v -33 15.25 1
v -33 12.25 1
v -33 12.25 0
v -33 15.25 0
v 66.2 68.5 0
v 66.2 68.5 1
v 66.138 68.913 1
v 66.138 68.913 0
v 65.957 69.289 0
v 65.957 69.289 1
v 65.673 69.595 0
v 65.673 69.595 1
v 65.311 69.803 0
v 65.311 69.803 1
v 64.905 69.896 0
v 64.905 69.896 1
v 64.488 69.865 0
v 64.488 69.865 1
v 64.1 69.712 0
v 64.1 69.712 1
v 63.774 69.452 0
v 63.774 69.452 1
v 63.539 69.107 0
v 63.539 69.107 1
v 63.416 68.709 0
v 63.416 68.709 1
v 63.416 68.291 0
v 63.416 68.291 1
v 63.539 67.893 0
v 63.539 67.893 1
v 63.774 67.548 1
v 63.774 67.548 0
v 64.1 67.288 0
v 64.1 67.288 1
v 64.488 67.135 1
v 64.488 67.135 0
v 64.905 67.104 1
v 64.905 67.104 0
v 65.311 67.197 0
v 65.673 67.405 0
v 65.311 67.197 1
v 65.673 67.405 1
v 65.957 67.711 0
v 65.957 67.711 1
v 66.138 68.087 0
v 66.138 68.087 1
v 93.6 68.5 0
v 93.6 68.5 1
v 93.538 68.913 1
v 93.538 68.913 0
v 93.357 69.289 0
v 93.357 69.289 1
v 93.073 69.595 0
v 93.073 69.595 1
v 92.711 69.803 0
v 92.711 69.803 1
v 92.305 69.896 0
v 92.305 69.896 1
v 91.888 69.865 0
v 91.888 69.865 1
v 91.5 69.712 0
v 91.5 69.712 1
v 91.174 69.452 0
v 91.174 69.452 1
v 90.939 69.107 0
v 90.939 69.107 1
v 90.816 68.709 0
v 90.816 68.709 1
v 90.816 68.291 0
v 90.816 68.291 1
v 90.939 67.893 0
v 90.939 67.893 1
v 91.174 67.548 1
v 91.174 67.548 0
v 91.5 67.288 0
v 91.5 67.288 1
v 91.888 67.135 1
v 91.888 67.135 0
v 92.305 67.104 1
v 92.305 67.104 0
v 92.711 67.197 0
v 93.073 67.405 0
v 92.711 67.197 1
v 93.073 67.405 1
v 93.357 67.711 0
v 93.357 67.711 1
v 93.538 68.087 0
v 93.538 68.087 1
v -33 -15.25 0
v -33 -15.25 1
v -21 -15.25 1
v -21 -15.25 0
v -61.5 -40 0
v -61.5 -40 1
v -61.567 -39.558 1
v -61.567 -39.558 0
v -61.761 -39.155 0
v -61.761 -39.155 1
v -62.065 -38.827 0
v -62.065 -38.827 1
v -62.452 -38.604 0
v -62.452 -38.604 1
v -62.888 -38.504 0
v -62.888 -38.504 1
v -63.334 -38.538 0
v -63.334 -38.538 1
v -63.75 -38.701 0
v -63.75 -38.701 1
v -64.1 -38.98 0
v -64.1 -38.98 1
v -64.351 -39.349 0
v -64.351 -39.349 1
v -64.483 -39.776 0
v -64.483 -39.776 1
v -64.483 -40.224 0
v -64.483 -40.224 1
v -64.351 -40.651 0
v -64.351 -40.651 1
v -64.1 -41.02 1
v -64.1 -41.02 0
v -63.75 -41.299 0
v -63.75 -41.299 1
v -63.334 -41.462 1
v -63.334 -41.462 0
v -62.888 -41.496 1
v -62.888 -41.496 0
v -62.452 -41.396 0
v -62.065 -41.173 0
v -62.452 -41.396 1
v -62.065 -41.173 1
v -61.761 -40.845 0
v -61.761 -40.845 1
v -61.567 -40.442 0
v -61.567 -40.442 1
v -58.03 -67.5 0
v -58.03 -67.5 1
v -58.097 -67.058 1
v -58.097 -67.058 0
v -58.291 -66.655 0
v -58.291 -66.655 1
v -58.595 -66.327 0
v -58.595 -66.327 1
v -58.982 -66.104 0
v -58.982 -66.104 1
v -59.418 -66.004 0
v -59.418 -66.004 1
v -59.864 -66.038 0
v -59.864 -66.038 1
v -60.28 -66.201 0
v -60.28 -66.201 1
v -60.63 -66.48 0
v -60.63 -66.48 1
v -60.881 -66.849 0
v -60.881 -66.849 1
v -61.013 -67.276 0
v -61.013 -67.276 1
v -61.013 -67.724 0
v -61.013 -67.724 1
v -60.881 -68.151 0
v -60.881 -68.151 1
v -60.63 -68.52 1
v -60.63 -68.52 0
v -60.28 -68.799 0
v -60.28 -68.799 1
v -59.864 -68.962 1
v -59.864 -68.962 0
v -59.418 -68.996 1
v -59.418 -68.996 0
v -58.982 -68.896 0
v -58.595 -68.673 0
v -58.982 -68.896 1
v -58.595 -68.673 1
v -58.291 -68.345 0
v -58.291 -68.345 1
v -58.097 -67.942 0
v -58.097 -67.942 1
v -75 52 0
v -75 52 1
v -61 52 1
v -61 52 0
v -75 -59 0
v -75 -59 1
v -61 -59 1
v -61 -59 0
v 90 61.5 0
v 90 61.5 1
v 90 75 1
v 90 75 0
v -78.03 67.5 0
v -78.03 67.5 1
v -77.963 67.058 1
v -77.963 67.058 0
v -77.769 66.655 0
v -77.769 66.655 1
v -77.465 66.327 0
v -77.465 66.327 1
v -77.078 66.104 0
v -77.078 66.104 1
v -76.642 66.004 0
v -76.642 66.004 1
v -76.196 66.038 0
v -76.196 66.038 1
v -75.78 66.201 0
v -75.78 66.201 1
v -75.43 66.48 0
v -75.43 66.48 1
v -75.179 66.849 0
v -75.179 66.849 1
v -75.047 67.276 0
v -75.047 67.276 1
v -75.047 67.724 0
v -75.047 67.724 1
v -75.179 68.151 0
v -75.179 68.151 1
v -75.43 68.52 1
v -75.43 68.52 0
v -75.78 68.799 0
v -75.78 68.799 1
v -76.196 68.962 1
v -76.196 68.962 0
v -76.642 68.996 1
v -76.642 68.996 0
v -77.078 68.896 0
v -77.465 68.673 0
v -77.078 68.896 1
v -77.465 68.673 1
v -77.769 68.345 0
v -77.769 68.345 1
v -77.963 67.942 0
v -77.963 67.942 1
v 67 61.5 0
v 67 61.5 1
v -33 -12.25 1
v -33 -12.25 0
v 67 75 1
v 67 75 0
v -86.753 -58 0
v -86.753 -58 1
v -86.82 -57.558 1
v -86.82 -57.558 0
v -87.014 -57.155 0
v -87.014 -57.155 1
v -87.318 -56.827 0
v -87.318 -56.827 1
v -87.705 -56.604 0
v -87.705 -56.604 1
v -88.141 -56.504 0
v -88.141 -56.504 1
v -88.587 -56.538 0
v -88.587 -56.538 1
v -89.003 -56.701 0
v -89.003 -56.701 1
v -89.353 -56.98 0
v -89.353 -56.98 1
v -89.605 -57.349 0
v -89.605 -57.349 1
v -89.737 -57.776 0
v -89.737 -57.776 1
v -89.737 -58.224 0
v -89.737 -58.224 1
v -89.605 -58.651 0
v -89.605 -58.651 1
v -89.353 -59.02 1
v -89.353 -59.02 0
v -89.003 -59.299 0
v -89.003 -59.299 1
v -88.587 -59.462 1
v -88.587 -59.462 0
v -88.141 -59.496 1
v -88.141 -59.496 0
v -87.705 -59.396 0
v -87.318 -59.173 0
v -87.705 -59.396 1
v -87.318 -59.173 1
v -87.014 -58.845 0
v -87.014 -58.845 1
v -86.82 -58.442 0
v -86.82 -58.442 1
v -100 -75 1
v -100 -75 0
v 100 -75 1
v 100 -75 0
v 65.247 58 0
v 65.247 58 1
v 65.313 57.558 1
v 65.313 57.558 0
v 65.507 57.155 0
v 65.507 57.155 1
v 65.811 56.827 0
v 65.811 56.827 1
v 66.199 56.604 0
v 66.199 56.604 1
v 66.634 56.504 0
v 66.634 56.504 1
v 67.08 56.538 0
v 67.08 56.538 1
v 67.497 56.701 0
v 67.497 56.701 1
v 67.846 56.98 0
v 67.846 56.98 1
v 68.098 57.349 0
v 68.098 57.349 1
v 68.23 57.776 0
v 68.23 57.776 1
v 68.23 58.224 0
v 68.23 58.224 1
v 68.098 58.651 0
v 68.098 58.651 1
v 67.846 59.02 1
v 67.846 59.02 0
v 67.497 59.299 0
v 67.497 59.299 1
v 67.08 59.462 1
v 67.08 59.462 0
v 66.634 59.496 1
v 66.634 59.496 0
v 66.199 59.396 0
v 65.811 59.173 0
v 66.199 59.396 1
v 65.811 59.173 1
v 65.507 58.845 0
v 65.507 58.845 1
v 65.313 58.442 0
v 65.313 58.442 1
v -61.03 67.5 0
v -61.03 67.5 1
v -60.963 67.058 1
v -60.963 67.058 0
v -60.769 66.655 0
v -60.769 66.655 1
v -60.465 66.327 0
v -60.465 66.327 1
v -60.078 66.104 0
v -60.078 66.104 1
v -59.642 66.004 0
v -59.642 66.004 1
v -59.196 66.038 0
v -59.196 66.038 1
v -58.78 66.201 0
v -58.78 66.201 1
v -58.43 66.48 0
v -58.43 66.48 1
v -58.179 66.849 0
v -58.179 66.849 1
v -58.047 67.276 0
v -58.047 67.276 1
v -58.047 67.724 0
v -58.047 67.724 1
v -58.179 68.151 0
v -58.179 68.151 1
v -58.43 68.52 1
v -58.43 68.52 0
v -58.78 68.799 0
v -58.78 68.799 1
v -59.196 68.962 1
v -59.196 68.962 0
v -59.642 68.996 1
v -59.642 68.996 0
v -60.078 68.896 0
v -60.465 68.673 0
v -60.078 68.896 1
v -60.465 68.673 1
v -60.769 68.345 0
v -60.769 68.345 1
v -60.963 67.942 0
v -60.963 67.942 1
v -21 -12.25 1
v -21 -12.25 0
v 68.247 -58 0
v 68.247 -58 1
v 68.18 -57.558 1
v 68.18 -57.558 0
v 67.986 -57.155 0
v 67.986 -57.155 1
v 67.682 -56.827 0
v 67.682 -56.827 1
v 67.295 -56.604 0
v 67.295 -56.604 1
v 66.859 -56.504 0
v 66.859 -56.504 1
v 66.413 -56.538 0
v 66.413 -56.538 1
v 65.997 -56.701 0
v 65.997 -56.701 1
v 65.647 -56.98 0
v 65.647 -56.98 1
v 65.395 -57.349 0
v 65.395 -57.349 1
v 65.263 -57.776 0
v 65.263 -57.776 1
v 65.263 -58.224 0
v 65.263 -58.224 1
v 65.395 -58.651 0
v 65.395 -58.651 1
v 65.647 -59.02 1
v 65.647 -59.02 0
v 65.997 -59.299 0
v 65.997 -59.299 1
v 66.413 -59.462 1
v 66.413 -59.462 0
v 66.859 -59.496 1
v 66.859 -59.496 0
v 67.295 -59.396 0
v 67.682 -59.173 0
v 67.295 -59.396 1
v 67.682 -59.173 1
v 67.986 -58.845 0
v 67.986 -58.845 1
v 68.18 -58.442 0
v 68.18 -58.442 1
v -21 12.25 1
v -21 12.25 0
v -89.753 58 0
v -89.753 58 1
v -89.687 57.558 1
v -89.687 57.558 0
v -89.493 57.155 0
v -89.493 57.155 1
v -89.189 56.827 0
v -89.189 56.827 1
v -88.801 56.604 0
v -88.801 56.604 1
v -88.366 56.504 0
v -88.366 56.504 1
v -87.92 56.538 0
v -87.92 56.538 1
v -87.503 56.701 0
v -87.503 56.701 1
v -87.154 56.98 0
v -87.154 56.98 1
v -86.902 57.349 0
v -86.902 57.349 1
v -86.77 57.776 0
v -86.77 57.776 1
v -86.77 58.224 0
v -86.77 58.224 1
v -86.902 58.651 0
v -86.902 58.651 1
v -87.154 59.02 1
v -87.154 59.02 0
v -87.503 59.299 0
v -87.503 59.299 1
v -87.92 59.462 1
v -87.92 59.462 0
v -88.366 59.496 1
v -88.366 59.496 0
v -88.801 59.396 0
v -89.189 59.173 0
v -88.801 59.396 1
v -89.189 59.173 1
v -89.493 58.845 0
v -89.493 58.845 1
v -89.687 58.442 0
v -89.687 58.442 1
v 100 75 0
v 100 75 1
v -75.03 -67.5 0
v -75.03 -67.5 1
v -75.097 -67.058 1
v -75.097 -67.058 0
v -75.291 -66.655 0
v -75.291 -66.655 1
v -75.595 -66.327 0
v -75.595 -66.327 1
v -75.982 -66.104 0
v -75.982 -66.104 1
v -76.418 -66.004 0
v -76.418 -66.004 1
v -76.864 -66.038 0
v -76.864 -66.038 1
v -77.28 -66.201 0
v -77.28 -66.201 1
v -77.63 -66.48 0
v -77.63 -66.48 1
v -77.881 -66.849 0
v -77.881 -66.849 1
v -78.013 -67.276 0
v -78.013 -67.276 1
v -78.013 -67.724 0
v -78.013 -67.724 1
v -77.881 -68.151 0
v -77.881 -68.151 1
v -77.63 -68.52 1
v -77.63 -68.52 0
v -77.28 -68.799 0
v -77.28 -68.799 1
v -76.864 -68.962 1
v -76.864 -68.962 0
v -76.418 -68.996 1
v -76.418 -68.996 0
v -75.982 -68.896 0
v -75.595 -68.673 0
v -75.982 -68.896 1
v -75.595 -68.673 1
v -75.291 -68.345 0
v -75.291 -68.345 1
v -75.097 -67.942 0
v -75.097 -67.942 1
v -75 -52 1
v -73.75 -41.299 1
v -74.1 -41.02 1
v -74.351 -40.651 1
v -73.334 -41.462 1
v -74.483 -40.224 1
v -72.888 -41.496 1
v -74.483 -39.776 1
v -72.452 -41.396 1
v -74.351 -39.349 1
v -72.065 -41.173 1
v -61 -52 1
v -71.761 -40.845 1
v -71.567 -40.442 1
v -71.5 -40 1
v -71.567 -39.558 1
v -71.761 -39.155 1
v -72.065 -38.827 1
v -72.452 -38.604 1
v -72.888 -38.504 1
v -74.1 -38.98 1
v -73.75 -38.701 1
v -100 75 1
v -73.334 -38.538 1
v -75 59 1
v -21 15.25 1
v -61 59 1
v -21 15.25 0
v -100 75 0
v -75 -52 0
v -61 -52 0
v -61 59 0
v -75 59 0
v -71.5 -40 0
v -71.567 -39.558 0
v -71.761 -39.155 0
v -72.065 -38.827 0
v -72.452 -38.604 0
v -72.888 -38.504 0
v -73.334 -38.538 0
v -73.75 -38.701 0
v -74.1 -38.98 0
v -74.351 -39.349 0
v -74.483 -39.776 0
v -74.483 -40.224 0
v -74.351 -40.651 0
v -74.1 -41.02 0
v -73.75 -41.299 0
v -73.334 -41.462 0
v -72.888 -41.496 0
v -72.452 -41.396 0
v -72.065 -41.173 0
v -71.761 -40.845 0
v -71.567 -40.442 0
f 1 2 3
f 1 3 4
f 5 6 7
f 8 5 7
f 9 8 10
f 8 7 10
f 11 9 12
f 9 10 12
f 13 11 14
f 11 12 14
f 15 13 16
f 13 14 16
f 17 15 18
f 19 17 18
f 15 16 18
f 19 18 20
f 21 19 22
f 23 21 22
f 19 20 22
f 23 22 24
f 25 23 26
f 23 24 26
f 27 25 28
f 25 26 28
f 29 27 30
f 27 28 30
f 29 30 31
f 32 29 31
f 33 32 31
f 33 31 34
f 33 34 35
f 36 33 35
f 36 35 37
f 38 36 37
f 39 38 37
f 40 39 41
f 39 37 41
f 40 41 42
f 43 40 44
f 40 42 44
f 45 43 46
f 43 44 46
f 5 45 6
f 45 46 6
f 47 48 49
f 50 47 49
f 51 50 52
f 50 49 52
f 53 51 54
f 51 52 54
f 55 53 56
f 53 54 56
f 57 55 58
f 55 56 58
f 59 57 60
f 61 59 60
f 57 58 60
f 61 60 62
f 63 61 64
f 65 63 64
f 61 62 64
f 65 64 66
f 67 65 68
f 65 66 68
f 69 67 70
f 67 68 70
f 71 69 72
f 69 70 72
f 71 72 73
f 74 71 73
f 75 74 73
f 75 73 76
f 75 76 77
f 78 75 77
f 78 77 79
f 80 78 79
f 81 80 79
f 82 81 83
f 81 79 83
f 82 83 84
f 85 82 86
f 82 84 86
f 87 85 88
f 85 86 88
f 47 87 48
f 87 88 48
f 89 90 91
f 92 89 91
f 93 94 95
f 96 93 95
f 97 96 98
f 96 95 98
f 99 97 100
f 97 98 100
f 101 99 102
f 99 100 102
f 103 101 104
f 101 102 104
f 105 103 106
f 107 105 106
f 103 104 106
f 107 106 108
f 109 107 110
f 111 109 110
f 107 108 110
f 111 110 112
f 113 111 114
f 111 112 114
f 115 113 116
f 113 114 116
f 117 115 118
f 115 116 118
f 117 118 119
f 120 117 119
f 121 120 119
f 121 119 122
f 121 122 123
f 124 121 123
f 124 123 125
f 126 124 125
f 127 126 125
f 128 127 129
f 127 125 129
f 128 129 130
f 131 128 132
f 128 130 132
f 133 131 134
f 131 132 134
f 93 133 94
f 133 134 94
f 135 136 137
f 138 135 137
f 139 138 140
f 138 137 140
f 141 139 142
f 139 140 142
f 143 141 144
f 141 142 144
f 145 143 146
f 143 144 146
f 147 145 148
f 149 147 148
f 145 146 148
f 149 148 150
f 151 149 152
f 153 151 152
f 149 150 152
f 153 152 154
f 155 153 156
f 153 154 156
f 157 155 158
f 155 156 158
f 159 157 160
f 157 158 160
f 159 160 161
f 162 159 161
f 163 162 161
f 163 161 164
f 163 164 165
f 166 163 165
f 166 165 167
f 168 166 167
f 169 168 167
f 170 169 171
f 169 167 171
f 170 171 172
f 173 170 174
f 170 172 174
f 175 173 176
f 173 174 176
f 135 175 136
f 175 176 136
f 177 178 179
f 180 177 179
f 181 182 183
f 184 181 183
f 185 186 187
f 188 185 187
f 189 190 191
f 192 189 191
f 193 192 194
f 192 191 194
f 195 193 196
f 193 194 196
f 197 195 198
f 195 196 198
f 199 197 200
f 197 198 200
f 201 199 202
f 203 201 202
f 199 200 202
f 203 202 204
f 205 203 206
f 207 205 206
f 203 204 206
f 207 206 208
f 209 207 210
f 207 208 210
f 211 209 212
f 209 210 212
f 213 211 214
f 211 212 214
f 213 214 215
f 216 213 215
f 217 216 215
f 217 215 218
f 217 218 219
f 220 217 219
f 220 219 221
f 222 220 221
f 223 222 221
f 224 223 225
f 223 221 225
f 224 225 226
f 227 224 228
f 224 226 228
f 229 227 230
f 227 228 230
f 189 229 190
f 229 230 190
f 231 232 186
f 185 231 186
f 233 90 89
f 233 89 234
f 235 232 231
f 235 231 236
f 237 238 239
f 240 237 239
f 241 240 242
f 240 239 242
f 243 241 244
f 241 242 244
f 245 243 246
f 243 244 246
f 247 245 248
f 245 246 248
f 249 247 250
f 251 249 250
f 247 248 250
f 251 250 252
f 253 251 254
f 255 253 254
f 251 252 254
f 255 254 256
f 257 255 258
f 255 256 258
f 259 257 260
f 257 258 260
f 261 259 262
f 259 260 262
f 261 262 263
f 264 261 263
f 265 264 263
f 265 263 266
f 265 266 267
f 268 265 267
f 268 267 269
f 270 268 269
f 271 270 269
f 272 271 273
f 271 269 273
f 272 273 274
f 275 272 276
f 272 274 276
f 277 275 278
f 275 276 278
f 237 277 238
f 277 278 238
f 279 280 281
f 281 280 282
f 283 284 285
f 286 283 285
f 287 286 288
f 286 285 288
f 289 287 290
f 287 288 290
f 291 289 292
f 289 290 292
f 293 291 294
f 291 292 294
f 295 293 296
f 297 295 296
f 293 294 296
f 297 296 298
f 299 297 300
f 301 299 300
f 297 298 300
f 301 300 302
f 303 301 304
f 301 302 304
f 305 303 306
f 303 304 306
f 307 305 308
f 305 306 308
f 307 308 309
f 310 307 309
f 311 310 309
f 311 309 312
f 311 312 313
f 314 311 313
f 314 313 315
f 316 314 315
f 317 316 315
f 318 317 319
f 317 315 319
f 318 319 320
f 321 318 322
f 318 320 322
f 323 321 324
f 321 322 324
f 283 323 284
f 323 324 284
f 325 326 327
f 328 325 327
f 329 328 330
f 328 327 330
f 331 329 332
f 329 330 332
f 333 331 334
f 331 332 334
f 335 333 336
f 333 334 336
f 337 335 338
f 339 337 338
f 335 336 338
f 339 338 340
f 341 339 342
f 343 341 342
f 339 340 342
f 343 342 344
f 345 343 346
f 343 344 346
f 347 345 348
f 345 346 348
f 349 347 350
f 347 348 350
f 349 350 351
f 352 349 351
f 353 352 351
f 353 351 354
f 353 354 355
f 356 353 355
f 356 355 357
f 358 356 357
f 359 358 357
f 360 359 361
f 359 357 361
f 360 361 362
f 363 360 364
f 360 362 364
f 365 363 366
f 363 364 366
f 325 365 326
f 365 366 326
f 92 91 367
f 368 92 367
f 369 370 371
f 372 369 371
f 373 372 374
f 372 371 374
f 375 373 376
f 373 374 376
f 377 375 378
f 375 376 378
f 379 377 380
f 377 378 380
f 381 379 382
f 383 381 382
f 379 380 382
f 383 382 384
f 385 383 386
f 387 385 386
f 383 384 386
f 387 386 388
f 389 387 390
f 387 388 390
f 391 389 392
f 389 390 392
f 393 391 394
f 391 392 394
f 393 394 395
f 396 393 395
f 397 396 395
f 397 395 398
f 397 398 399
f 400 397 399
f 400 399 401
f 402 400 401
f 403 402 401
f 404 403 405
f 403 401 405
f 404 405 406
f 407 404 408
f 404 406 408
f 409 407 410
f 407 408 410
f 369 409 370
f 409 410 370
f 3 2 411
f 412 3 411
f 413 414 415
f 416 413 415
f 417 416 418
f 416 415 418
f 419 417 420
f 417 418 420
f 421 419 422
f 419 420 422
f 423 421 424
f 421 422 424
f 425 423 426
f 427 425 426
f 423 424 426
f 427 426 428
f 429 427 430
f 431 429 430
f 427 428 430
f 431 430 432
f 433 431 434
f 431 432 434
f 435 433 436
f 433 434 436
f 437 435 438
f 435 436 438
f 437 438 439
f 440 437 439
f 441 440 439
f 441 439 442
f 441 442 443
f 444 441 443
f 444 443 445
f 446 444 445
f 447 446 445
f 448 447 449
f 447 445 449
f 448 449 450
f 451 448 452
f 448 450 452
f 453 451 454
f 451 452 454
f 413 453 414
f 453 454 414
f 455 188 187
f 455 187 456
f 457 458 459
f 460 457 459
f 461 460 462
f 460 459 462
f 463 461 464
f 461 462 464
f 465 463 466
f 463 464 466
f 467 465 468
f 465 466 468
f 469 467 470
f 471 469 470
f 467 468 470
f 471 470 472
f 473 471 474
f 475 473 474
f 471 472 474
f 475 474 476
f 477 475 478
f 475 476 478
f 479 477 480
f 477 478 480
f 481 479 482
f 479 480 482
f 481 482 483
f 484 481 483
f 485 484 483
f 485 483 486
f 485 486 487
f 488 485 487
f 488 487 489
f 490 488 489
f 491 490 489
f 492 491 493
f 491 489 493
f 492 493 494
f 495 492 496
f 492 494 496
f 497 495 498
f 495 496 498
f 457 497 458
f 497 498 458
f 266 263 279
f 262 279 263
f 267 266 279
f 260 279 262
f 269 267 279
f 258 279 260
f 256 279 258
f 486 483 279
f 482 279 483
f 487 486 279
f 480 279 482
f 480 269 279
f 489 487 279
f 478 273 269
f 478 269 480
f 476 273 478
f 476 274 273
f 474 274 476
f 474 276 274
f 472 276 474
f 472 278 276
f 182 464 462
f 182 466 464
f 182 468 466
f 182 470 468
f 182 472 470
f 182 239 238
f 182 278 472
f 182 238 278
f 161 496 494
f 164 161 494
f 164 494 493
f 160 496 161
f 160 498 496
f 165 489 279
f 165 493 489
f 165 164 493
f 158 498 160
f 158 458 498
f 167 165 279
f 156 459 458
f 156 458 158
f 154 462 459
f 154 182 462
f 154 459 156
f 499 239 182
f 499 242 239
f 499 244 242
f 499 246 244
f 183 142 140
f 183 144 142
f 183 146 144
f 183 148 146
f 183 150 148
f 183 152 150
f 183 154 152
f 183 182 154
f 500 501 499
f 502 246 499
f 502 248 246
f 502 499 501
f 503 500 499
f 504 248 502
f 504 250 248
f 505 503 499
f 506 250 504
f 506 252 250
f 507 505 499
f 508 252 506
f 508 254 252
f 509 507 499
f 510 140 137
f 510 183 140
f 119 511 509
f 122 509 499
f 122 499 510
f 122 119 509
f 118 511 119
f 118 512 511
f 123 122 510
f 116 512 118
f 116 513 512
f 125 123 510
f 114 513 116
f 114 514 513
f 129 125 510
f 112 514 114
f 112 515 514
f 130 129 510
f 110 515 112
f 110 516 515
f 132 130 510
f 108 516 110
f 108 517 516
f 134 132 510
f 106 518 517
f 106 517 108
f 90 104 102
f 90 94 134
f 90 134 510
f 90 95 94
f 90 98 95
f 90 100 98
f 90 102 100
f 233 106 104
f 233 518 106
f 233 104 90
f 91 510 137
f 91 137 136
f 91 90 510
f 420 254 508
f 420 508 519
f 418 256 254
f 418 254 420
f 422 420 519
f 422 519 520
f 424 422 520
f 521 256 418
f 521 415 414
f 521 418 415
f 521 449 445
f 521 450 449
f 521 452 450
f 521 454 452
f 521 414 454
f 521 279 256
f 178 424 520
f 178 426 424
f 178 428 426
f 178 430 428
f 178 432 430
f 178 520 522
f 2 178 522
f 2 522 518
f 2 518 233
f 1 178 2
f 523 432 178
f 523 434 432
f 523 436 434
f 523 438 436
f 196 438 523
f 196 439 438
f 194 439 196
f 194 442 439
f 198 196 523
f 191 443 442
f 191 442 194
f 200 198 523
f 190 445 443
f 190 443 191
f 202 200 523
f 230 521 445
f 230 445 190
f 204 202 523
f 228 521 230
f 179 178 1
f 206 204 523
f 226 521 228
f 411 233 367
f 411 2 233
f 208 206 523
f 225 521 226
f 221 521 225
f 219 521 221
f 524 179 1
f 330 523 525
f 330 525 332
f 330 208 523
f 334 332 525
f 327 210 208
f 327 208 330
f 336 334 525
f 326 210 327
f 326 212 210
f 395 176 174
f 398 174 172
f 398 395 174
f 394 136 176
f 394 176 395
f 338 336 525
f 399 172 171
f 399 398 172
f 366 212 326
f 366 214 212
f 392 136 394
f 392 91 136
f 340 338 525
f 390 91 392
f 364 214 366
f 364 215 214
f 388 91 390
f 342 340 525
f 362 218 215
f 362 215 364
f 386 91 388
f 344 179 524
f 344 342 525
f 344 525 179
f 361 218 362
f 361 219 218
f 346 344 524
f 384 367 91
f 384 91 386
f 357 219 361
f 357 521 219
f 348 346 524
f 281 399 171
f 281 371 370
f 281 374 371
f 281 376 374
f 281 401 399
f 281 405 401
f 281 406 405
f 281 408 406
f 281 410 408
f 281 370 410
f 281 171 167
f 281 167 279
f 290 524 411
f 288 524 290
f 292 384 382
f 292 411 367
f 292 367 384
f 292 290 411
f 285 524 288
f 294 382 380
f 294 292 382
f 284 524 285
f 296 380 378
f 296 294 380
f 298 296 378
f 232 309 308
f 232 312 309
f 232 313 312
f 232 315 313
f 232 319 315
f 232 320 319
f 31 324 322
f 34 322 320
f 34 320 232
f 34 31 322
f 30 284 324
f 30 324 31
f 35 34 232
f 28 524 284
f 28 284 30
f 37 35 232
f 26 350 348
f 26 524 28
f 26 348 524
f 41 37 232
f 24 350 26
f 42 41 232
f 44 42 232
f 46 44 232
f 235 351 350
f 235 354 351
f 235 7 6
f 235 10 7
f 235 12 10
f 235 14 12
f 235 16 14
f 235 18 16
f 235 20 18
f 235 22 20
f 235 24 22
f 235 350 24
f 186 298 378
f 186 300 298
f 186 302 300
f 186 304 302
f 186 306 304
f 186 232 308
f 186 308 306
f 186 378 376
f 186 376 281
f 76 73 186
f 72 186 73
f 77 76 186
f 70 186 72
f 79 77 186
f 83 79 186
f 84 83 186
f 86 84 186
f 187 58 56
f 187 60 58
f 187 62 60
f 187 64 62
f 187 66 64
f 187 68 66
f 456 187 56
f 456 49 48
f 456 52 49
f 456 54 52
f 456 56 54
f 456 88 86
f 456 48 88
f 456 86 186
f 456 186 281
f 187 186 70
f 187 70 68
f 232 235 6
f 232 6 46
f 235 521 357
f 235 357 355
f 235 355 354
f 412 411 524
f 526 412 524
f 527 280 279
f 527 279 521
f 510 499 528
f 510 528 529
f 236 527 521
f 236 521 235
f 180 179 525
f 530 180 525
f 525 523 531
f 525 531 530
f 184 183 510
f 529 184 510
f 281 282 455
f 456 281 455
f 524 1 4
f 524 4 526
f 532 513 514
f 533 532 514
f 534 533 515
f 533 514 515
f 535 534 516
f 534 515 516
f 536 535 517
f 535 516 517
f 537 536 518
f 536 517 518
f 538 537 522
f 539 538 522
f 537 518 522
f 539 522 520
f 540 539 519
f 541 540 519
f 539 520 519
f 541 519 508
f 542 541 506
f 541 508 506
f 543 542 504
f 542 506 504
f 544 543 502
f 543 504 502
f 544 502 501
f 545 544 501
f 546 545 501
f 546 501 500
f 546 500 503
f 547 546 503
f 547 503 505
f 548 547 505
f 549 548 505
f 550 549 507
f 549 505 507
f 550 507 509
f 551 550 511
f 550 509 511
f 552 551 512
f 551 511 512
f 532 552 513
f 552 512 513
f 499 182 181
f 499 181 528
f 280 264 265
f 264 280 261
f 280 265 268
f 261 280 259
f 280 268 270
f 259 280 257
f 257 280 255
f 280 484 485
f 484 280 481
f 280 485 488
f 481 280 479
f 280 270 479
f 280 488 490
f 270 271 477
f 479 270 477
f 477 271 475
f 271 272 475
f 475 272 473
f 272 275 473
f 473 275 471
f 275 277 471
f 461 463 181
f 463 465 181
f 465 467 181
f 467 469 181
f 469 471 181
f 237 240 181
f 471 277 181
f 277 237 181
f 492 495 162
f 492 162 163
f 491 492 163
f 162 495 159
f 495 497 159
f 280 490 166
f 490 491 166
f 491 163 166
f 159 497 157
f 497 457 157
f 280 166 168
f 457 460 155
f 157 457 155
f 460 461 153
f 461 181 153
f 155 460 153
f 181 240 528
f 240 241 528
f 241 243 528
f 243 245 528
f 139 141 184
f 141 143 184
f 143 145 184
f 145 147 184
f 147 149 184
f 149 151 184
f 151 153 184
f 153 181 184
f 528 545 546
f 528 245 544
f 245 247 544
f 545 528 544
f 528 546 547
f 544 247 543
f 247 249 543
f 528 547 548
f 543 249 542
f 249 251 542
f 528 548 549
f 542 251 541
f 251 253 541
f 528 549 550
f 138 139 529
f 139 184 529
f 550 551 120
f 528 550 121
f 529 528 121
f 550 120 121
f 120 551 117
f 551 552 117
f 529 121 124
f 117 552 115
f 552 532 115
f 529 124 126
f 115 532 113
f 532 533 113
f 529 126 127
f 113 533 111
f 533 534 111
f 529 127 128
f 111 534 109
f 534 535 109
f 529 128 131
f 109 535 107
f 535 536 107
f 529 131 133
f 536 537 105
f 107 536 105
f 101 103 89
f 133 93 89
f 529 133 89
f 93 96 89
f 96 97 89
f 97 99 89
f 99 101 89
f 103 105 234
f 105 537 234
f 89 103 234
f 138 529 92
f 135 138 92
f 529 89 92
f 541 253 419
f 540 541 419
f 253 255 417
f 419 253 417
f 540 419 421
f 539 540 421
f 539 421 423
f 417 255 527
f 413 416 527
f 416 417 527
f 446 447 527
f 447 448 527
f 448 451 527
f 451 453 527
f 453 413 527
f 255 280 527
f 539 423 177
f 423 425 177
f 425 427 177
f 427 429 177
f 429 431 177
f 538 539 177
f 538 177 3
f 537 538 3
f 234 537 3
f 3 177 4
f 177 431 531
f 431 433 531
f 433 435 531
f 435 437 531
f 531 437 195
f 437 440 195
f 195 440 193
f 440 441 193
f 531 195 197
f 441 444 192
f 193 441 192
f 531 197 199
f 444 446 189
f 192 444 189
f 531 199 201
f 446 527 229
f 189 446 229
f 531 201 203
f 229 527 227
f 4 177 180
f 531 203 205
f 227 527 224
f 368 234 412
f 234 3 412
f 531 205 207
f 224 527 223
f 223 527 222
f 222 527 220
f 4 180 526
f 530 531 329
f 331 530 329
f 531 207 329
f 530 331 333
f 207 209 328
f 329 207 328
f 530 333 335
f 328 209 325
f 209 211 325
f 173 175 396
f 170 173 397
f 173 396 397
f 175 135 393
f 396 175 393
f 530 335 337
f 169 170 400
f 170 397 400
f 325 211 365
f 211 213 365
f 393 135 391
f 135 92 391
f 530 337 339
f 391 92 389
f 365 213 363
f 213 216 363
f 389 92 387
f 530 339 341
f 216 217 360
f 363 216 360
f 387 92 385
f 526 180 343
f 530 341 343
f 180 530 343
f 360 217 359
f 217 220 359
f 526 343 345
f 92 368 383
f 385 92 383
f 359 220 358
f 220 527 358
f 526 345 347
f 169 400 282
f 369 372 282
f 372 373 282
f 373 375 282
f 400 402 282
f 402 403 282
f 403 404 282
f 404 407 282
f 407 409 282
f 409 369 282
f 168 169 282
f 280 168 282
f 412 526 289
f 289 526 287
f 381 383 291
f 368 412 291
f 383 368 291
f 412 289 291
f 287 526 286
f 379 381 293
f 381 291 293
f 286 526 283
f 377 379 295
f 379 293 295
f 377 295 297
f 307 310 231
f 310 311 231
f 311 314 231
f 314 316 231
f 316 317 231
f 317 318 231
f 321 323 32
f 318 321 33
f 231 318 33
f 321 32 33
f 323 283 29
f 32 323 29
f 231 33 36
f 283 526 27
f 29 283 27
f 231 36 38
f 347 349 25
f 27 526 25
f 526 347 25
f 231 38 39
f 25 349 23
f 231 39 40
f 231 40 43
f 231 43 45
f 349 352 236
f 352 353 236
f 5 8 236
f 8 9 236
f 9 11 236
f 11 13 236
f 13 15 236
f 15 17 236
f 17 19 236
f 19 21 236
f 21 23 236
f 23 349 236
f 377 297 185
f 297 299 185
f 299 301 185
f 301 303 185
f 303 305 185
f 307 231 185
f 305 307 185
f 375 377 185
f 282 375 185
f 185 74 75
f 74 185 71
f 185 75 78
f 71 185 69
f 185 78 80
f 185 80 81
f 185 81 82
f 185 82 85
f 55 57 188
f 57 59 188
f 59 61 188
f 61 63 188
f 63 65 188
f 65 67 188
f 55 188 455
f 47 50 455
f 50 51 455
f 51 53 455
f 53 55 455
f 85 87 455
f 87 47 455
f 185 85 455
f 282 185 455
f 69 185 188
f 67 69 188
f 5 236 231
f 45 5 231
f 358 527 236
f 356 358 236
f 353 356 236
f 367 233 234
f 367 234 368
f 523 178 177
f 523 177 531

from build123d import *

# Parameters (mm, degrees)
SKETCH1_W           = 200
SKETCH1_H           = 150
BOSS_EXTRUDE1_DEPTH = 1
SKETCH2_R           = 1.5
SKETCH2_R_2         = 1.4
SKETCH2_W           = 14
SKETCH2_H           = 7
SKETCH2_W_2         = 12
SKETCH2_H_2         = 3
SKETCH2_W_3         = 23
SKETCH2_H_3         = 13.5
CUT_EXTRUDE1_DEPTH  = 1


with BuildPart() as part:
    # Sketch1 → Boss-Extrude1 (new body)
    with BuildSketch(Plane.XY):
        Rectangle(SKETCH1_W, SKETCH1_H)
    extrude(amount=BOSS_EXTRUDE1_DEPTH)

    # Sketch2 → Cut-Extrude1 (cut)
    with BuildSketch(Plane.XY.offset(1)):
        with Locations((-76.53, -67.5)):
            Circle(SKETCH2_R)
        with Locations((-59.53, -67.5)):
            Circle(SKETCH2_R)
        with Locations(Location((-59.53, 67.5, 0), (0, 0, 180))):
            Circle(SKETCH2_R)
        with Locations(Location((-76.53, 67.5, 0), (0, 0, 180))):
            Circle(SKETCH2_R)
        with Locations((-73, -40)):
            Circle(SKETCH2_R)
        with Locations((-63, -40)):
            Circle(SKETCH2_R)
        with Locations((-88.25346752, -58)):
            Circle(SKETCH2_R)
        with Locations((66.74653248, -58)):
            Circle(SKETCH2_R)
        with Locations(Location((66.74653248, 58, 0), (0, 0, 180))):
            Circle(SKETCH2_R)
        with Locations(Location((-88.25346752, 58, 0), (0, 0, 180))):
            Circle(SKETCH2_R)
        with Locations((64.8, 68.5)):
            Circle(SKETCH2_R_2)
        with Locations((92.2, 68.5)):
            Circle(SKETCH2_R_2)
        with Locations((-68, -55.5)):
            Rectangle(SKETCH2_W, SKETCH2_H)
        with Locations((-68, 55.5)):
            Rectangle(SKETCH2_W, SKETCH2_H)
        with Locations((-27, -13.75)):
            Rectangle(SKETCH2_W_2, SKETCH2_H_2)
        with Locations((-27, 13.75)):
            Rectangle(SKETCH2_W_2, SKETCH2_H_2)
        with Locations((78.5, 68.25)):
            Rectangle(SKETCH2_W_3, SKETCH2_H_3)
    extrude(amount=-CUT_EXTRUDE1_DEPTH, mode=Mode.SUBTRACT)


solid = part.part
